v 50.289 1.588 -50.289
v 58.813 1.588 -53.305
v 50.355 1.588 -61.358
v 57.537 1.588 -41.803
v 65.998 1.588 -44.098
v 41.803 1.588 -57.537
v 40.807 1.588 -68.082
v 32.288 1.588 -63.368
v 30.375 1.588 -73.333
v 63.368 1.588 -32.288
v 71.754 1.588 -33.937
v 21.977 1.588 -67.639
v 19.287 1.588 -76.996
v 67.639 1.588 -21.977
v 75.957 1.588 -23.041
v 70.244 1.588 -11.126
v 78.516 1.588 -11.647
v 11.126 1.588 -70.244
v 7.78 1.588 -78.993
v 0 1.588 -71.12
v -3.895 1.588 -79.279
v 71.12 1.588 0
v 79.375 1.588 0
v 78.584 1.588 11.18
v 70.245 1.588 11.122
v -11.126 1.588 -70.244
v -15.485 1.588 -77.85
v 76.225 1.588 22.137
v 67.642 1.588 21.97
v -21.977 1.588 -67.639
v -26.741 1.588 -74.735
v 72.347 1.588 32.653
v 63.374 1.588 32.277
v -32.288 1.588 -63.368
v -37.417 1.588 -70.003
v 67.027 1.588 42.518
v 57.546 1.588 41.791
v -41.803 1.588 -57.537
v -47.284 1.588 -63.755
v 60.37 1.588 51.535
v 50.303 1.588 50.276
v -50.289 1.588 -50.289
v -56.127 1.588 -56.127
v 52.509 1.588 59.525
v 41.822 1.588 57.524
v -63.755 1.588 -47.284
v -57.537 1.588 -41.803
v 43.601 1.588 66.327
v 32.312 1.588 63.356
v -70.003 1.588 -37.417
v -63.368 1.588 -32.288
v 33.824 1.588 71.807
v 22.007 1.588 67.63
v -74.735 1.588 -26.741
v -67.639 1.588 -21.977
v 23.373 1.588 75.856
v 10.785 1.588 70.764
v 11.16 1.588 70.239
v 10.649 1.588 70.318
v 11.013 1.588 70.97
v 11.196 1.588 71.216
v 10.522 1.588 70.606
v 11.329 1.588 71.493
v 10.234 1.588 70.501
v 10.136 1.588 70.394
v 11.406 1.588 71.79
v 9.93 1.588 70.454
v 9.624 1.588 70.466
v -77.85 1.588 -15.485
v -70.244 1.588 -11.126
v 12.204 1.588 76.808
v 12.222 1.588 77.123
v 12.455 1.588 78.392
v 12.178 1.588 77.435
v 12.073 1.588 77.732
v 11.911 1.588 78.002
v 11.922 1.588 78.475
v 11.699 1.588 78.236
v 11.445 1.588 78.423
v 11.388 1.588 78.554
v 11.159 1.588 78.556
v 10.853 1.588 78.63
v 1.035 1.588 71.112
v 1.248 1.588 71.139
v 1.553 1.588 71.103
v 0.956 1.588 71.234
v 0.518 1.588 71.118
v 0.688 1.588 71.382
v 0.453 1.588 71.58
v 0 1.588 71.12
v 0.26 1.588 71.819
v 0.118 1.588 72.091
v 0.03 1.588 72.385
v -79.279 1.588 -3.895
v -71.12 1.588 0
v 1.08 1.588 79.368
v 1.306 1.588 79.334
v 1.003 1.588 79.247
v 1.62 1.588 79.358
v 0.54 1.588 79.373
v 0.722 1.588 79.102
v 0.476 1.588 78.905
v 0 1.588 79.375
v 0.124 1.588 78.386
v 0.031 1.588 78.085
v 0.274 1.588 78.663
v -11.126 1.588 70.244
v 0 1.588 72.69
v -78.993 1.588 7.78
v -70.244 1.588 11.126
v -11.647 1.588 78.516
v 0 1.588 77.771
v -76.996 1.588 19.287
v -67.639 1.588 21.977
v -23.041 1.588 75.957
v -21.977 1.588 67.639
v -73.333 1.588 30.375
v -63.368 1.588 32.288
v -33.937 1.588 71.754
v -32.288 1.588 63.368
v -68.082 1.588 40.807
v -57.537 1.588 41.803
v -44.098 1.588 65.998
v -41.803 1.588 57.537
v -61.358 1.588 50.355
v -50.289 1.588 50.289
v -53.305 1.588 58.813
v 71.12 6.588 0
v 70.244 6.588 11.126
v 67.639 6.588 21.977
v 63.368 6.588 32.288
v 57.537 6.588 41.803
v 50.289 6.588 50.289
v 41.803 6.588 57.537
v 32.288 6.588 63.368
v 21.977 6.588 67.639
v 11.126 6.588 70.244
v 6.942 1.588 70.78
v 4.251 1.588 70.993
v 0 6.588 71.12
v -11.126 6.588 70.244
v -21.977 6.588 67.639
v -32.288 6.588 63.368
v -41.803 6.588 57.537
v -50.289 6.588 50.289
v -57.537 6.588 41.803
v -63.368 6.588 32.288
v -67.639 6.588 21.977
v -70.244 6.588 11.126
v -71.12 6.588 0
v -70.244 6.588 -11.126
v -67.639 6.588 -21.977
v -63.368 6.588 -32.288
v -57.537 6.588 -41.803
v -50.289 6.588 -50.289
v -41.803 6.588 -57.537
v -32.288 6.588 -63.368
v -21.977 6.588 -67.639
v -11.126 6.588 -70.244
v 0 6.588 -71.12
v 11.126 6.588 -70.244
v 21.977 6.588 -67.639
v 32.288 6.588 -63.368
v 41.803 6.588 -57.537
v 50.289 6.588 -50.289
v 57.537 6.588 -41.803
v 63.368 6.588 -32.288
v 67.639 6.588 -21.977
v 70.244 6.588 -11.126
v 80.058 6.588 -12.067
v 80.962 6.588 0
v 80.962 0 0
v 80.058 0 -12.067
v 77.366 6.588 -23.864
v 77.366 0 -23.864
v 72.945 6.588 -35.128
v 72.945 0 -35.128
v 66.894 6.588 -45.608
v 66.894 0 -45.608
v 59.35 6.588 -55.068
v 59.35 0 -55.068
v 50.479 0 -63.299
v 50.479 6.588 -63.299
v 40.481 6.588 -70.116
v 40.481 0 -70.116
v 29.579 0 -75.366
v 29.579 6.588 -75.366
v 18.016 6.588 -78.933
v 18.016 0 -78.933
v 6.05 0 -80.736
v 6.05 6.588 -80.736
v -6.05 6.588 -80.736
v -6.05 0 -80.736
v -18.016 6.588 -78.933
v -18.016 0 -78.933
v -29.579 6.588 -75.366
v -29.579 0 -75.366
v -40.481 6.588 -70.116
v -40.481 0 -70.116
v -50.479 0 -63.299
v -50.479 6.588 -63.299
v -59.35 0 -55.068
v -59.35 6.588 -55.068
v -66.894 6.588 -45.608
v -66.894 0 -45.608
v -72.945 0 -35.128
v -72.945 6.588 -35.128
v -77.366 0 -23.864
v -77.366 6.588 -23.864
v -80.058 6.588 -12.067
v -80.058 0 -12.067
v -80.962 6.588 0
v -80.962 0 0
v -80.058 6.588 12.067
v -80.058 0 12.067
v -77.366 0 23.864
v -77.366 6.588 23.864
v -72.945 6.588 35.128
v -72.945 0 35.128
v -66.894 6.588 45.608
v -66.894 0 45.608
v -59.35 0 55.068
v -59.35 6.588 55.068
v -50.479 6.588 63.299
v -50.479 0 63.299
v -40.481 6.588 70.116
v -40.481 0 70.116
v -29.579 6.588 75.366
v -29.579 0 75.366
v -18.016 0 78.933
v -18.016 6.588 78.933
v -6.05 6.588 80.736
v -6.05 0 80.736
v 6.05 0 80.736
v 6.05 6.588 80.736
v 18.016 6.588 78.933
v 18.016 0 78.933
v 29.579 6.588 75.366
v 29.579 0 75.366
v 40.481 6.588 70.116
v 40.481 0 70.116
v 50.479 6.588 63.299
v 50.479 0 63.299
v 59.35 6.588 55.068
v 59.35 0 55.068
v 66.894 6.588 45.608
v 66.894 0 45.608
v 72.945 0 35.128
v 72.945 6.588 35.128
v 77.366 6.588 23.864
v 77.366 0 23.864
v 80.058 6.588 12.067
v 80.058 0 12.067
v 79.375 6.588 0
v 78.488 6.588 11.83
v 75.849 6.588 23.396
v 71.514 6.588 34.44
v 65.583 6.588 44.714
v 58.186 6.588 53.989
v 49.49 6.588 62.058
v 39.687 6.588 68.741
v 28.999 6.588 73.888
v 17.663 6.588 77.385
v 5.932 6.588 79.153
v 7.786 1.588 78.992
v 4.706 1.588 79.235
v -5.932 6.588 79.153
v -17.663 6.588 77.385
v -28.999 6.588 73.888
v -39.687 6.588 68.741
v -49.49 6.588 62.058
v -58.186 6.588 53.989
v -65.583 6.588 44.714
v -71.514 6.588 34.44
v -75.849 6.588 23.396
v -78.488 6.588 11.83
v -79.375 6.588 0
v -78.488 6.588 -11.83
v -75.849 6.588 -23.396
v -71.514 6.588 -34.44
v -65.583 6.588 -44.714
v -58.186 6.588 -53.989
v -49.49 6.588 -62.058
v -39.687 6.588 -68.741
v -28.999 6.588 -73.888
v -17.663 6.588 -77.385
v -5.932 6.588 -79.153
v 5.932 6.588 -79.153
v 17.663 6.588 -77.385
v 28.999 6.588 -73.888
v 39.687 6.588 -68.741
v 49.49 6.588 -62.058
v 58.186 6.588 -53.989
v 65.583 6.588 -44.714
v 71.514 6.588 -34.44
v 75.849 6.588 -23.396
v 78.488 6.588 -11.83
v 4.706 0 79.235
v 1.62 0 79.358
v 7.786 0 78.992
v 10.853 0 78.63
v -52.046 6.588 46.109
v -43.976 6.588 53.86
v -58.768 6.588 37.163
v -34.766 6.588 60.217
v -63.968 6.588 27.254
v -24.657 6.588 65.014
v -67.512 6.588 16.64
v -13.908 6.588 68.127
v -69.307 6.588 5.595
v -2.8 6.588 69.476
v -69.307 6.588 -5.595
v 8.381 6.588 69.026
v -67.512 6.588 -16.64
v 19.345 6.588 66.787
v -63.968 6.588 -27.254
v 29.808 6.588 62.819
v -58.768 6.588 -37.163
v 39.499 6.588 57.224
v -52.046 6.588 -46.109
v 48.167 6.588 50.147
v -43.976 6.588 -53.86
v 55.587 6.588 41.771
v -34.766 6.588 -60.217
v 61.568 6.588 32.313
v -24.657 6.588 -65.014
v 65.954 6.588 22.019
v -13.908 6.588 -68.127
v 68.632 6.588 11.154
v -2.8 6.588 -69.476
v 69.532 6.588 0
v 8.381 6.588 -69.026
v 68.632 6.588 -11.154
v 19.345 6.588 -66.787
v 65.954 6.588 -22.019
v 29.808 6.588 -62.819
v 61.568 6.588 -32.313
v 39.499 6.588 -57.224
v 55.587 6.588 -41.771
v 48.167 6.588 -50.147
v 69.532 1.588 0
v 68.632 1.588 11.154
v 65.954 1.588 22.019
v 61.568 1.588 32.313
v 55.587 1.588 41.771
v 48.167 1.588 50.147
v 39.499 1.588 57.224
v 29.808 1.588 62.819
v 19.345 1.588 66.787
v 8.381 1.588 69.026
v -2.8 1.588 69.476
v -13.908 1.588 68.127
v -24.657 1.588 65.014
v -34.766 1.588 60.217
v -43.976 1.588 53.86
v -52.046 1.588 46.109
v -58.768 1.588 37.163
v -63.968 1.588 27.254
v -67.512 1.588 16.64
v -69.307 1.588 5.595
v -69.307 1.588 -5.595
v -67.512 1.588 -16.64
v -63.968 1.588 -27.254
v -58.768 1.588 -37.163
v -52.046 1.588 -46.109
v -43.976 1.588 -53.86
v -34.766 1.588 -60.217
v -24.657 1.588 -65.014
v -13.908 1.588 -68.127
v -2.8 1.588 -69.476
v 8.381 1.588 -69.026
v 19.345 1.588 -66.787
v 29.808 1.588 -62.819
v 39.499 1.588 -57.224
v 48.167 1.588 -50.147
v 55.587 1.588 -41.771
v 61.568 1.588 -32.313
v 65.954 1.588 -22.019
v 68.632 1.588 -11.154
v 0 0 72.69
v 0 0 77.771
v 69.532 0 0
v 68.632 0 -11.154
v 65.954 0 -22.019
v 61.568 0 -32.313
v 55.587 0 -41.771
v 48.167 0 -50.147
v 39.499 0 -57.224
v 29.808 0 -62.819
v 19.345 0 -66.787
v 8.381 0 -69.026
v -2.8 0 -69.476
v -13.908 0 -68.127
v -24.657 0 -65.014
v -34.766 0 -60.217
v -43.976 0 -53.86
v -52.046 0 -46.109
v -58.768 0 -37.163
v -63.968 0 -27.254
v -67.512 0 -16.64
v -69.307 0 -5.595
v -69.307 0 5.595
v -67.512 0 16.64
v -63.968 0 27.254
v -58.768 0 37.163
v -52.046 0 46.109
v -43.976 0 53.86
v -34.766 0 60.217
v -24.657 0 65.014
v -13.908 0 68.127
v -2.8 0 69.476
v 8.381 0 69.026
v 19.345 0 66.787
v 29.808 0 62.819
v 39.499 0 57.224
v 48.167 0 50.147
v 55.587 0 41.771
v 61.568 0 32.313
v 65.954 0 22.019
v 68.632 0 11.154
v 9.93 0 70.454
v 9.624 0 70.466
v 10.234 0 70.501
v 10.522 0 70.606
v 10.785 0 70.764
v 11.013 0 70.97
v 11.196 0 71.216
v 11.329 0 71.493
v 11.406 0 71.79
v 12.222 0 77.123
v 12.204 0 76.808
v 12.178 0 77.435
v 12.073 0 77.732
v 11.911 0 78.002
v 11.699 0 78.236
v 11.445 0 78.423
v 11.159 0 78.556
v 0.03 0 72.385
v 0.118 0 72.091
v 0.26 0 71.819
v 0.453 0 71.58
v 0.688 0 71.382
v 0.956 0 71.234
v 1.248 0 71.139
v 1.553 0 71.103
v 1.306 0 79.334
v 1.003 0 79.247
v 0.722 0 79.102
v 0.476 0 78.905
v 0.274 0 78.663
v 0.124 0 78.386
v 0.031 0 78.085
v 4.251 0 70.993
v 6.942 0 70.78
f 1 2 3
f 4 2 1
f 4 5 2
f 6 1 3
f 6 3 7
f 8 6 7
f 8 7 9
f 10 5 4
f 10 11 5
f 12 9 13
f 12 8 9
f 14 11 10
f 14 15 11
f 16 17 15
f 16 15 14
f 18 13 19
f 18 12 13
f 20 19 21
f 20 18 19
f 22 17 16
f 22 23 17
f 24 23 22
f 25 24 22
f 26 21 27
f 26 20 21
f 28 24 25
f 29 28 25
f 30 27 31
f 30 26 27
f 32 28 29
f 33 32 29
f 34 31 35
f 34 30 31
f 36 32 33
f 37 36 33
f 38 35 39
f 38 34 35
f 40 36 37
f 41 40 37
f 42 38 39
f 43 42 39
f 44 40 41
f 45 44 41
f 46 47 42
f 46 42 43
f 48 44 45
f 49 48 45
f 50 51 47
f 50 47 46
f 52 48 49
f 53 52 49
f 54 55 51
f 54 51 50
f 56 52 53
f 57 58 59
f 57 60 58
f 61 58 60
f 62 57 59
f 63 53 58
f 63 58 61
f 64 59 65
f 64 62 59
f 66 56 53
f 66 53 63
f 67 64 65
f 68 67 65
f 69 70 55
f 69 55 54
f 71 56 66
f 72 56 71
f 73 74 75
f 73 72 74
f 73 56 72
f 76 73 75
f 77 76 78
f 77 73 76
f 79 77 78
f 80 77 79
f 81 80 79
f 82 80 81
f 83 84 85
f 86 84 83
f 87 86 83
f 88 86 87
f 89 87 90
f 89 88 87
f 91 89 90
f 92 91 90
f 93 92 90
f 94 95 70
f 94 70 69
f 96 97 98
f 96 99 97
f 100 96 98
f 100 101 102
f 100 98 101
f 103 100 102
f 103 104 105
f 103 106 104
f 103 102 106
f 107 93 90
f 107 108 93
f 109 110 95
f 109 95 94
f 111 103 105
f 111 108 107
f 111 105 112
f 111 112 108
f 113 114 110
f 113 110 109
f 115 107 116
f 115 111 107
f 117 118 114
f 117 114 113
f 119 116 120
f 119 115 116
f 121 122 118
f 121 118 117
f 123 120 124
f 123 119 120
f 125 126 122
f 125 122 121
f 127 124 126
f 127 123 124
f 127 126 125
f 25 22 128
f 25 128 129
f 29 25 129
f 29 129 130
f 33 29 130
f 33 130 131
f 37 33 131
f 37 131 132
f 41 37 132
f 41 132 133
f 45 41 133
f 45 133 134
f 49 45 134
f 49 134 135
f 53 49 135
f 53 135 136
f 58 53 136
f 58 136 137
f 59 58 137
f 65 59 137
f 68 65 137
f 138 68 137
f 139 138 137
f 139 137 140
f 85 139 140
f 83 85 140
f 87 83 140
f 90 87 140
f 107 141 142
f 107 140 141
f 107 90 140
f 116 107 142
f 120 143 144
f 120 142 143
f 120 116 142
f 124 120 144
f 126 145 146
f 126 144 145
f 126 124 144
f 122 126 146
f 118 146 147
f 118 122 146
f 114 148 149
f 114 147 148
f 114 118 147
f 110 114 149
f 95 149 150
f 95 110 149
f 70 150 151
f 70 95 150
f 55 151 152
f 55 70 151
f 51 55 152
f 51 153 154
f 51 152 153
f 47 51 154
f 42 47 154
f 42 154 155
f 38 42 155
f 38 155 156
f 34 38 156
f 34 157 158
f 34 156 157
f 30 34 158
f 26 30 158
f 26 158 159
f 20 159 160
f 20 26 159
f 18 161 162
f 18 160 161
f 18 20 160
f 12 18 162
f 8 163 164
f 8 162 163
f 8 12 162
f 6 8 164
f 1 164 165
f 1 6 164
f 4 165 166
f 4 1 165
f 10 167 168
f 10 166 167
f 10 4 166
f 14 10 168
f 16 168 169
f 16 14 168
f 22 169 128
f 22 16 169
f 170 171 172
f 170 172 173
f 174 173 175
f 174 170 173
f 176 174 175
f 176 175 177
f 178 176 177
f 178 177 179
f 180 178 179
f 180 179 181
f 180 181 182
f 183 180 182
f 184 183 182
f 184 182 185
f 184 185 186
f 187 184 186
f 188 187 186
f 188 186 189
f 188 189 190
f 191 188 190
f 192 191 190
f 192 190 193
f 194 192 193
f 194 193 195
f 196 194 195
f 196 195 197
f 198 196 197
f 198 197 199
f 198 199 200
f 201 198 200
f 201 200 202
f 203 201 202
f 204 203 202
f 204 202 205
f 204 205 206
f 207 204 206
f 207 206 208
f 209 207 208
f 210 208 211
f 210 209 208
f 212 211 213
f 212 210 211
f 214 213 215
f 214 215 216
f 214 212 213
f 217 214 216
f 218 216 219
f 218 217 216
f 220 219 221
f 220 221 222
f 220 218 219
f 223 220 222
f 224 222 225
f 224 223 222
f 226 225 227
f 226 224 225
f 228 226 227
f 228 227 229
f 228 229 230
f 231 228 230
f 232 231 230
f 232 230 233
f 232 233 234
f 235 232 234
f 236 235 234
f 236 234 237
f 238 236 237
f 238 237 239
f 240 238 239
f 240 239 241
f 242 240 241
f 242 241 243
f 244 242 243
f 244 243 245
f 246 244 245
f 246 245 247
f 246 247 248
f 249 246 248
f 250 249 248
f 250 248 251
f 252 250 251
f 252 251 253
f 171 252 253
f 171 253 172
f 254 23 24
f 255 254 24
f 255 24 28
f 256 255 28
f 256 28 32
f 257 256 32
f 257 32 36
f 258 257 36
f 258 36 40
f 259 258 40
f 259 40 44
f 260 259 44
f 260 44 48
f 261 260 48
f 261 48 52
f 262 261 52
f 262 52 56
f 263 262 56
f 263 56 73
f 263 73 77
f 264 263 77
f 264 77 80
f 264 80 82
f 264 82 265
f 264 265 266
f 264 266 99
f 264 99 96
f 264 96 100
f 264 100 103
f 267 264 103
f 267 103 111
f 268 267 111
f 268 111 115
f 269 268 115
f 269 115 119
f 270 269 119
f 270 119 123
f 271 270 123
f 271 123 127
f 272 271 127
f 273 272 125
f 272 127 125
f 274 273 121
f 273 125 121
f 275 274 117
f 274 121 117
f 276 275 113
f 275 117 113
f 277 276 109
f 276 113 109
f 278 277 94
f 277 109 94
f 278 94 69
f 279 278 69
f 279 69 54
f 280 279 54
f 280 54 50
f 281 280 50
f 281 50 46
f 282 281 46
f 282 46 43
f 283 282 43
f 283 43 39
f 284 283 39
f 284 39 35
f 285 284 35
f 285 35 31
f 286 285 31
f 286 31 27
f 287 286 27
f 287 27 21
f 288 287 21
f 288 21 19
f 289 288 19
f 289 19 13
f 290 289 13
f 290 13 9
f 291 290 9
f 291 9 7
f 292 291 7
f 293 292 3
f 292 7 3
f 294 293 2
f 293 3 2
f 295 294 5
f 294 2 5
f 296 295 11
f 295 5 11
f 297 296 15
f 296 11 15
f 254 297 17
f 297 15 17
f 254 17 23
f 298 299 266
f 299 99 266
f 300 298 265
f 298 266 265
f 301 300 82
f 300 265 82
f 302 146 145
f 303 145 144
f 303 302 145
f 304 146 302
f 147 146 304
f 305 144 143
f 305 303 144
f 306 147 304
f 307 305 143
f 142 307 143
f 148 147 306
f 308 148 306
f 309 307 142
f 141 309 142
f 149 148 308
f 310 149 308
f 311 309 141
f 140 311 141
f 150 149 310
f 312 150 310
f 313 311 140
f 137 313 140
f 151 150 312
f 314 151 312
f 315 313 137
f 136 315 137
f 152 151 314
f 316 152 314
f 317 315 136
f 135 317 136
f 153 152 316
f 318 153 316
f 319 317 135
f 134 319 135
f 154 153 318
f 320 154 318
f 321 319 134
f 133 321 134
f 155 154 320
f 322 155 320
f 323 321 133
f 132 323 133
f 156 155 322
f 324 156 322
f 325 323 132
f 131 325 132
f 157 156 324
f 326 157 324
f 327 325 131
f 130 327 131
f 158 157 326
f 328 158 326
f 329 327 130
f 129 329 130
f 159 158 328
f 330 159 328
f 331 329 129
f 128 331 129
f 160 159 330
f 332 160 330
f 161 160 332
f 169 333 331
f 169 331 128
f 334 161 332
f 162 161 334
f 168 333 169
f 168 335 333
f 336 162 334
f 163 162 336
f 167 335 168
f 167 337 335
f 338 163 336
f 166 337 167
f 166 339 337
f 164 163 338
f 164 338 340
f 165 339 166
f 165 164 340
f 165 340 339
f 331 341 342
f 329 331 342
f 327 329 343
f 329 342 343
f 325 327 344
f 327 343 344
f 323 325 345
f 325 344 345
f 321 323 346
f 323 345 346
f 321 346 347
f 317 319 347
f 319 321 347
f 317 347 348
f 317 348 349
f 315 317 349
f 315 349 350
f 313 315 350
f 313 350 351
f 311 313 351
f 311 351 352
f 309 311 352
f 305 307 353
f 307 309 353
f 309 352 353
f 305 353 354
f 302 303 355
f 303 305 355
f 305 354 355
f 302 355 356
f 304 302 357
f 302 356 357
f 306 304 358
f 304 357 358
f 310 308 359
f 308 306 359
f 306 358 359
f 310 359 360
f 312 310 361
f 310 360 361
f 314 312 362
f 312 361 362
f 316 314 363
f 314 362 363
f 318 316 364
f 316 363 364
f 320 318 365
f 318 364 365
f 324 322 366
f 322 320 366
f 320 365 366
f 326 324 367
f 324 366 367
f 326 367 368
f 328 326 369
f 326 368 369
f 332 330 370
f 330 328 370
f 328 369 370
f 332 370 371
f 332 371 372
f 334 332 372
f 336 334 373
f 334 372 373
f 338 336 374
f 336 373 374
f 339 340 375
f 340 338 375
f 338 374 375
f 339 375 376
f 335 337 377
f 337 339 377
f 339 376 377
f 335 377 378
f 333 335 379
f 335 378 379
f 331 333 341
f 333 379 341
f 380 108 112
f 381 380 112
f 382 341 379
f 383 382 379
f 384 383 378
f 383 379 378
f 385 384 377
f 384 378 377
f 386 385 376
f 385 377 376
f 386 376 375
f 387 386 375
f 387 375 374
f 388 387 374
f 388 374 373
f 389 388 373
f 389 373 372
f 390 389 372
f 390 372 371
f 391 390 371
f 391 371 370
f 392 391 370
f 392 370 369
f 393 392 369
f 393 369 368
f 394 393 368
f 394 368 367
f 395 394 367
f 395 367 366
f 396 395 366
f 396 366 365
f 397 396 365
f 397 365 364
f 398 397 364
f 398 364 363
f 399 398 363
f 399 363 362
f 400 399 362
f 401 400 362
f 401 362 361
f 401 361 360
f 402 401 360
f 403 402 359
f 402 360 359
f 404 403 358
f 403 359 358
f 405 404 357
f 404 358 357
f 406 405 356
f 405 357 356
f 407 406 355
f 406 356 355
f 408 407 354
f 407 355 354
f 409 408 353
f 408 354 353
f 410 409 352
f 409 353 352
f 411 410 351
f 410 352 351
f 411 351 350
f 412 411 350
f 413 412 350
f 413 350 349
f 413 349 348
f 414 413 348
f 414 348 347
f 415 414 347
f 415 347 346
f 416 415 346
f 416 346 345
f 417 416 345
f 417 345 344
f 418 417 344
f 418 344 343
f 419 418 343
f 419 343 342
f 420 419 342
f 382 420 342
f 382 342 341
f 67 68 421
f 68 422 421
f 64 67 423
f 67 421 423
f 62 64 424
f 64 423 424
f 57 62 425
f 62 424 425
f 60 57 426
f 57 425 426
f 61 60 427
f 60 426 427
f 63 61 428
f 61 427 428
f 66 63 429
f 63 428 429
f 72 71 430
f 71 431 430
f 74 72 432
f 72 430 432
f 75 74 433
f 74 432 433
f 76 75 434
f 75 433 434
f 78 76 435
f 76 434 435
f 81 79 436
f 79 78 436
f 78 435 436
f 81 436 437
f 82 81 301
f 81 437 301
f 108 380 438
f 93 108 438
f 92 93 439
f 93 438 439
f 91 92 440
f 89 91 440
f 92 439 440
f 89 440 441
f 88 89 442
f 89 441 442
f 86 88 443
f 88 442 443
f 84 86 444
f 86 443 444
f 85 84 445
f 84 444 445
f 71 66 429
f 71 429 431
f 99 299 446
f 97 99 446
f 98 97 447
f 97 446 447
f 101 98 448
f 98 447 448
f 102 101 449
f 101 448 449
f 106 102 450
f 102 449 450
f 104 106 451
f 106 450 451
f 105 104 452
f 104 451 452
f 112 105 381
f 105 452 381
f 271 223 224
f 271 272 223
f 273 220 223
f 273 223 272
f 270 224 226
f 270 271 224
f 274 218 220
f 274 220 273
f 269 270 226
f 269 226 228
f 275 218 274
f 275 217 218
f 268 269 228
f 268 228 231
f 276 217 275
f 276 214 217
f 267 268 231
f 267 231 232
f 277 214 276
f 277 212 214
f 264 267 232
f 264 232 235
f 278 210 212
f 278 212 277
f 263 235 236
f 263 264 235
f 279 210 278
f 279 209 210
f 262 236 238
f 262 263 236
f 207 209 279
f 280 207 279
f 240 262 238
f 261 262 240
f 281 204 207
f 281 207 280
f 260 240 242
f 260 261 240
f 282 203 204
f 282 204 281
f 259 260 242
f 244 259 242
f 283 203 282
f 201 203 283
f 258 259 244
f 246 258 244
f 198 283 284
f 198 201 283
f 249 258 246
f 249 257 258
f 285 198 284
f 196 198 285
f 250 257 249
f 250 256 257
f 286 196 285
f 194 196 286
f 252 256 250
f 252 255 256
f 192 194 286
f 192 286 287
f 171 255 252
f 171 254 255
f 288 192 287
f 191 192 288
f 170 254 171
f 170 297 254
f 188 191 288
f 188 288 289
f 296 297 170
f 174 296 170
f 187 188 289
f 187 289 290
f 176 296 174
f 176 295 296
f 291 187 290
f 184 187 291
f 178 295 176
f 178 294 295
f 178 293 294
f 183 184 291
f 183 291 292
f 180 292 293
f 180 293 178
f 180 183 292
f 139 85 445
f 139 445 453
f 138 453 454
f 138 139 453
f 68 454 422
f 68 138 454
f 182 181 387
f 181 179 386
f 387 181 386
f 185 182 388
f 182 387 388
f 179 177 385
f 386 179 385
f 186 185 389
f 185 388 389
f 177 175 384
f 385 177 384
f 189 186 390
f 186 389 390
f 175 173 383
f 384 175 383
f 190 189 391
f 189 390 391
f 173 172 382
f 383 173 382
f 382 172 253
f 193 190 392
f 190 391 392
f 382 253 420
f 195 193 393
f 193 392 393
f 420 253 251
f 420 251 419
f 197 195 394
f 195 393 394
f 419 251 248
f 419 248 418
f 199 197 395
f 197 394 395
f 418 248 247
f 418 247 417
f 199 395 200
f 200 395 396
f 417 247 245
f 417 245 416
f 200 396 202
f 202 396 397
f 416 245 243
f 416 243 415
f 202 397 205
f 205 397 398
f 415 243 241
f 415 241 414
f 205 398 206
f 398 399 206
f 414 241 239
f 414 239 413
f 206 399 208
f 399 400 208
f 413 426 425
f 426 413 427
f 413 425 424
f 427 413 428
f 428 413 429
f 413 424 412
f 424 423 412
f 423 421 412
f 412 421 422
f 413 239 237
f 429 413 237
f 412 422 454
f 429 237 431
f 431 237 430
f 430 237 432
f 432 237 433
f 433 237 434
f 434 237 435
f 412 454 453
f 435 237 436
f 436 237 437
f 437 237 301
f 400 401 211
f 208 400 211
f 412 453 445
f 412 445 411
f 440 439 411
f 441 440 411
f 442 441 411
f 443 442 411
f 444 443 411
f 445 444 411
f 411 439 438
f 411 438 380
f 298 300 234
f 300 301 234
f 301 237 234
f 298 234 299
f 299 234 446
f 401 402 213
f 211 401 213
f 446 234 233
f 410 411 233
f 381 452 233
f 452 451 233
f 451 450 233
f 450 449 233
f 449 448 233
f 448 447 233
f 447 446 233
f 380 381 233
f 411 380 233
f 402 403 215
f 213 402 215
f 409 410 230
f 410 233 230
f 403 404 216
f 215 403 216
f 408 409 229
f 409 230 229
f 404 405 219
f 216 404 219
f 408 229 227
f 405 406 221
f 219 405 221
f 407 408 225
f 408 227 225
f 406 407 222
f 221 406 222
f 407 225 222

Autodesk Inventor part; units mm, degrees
ref_plane "YZ Plane" through (0, 0, 0) normal (1, 0, 0) x (0, 1, 0)
ref_plane "XZ Plane" through (0, 0, 0) normal (0, 1, 0) x (-1, 0, 0)
ref_plane "XY Plane" through (0, 0, 0) normal (0, 0, 1) x (1, 0, 0)
sketch "Sketch1" plane through (0, 0, 0) normal (0, 1, 0) x (-1, 0, 0)
  point P0 (0, 0)
sketch "Sketch2" plane through (0, 0, 0) normal (0, 1, 0) x (-1, 0, 0)
  circle A0 centre (0, 0) radius 79.375
  circle A1 centre (0, 0) radius 71.12
  dimension "d0" = 158.75
  dimension "d1" = 142.24
extrude "Extrusion1" add sketch "Sketch2" along normal blind 1.5875
sketch "Sketch3" plane through (0, 1.5875, 0) normal (0, 1, 0) x (1, 0, 0)
  circle A0 centre (0, 0) radius 80.9625
  circle A1 centre (0, 0) radius 69.5325
  circle A2 centre (0, 0) radius 71.12 projected
  circle A3 centre (0, 0) radius 79.375 projected
  circle A4 centre (0, 0) radius 79.375 projected
  circle A5 centre (0, 0) radius 71.12 projected
  dimension "d4" = 1.5875
  dimension "d5" = 1.5875
extrude "Extrusion2" add sketch "Sketch3" along normal blind 5 and the other way blind 1.5875
sketch "Sketch4" plane through (0, 1.5875, 0) normal (0, 1, 0) x (1, 0, 0)
  circle A0 centre (0, 0) radius 79.375 projected
  circle A1 centre (0, 0) radius 71.12 projected
  circle A2 centre (0, 0) radius 71.12 projected
  line L0 (0, -71.12) -> (0, -79.375)
  circle A3 centre (0, 0) radius 80.9625 projected
  line L1 (0, 0) -> (12.4554, -78.3917)
  point P0 (11.16, -70.2389)
extrude "Extrusion3" cut sketch "Sketch4" against normal blind 5 contours L0 A1 L1 A0 picked at (10.6461, -75.856)
fillet "Fillet1" radius 1.5875 4 edges at (11.16, 0.7937, 70.2389) (12.4554, 0.7937, 78.3917) (0, 0.7937, 79.375) (0, 0.7937, 71.12)
properties part number "led_ring"
